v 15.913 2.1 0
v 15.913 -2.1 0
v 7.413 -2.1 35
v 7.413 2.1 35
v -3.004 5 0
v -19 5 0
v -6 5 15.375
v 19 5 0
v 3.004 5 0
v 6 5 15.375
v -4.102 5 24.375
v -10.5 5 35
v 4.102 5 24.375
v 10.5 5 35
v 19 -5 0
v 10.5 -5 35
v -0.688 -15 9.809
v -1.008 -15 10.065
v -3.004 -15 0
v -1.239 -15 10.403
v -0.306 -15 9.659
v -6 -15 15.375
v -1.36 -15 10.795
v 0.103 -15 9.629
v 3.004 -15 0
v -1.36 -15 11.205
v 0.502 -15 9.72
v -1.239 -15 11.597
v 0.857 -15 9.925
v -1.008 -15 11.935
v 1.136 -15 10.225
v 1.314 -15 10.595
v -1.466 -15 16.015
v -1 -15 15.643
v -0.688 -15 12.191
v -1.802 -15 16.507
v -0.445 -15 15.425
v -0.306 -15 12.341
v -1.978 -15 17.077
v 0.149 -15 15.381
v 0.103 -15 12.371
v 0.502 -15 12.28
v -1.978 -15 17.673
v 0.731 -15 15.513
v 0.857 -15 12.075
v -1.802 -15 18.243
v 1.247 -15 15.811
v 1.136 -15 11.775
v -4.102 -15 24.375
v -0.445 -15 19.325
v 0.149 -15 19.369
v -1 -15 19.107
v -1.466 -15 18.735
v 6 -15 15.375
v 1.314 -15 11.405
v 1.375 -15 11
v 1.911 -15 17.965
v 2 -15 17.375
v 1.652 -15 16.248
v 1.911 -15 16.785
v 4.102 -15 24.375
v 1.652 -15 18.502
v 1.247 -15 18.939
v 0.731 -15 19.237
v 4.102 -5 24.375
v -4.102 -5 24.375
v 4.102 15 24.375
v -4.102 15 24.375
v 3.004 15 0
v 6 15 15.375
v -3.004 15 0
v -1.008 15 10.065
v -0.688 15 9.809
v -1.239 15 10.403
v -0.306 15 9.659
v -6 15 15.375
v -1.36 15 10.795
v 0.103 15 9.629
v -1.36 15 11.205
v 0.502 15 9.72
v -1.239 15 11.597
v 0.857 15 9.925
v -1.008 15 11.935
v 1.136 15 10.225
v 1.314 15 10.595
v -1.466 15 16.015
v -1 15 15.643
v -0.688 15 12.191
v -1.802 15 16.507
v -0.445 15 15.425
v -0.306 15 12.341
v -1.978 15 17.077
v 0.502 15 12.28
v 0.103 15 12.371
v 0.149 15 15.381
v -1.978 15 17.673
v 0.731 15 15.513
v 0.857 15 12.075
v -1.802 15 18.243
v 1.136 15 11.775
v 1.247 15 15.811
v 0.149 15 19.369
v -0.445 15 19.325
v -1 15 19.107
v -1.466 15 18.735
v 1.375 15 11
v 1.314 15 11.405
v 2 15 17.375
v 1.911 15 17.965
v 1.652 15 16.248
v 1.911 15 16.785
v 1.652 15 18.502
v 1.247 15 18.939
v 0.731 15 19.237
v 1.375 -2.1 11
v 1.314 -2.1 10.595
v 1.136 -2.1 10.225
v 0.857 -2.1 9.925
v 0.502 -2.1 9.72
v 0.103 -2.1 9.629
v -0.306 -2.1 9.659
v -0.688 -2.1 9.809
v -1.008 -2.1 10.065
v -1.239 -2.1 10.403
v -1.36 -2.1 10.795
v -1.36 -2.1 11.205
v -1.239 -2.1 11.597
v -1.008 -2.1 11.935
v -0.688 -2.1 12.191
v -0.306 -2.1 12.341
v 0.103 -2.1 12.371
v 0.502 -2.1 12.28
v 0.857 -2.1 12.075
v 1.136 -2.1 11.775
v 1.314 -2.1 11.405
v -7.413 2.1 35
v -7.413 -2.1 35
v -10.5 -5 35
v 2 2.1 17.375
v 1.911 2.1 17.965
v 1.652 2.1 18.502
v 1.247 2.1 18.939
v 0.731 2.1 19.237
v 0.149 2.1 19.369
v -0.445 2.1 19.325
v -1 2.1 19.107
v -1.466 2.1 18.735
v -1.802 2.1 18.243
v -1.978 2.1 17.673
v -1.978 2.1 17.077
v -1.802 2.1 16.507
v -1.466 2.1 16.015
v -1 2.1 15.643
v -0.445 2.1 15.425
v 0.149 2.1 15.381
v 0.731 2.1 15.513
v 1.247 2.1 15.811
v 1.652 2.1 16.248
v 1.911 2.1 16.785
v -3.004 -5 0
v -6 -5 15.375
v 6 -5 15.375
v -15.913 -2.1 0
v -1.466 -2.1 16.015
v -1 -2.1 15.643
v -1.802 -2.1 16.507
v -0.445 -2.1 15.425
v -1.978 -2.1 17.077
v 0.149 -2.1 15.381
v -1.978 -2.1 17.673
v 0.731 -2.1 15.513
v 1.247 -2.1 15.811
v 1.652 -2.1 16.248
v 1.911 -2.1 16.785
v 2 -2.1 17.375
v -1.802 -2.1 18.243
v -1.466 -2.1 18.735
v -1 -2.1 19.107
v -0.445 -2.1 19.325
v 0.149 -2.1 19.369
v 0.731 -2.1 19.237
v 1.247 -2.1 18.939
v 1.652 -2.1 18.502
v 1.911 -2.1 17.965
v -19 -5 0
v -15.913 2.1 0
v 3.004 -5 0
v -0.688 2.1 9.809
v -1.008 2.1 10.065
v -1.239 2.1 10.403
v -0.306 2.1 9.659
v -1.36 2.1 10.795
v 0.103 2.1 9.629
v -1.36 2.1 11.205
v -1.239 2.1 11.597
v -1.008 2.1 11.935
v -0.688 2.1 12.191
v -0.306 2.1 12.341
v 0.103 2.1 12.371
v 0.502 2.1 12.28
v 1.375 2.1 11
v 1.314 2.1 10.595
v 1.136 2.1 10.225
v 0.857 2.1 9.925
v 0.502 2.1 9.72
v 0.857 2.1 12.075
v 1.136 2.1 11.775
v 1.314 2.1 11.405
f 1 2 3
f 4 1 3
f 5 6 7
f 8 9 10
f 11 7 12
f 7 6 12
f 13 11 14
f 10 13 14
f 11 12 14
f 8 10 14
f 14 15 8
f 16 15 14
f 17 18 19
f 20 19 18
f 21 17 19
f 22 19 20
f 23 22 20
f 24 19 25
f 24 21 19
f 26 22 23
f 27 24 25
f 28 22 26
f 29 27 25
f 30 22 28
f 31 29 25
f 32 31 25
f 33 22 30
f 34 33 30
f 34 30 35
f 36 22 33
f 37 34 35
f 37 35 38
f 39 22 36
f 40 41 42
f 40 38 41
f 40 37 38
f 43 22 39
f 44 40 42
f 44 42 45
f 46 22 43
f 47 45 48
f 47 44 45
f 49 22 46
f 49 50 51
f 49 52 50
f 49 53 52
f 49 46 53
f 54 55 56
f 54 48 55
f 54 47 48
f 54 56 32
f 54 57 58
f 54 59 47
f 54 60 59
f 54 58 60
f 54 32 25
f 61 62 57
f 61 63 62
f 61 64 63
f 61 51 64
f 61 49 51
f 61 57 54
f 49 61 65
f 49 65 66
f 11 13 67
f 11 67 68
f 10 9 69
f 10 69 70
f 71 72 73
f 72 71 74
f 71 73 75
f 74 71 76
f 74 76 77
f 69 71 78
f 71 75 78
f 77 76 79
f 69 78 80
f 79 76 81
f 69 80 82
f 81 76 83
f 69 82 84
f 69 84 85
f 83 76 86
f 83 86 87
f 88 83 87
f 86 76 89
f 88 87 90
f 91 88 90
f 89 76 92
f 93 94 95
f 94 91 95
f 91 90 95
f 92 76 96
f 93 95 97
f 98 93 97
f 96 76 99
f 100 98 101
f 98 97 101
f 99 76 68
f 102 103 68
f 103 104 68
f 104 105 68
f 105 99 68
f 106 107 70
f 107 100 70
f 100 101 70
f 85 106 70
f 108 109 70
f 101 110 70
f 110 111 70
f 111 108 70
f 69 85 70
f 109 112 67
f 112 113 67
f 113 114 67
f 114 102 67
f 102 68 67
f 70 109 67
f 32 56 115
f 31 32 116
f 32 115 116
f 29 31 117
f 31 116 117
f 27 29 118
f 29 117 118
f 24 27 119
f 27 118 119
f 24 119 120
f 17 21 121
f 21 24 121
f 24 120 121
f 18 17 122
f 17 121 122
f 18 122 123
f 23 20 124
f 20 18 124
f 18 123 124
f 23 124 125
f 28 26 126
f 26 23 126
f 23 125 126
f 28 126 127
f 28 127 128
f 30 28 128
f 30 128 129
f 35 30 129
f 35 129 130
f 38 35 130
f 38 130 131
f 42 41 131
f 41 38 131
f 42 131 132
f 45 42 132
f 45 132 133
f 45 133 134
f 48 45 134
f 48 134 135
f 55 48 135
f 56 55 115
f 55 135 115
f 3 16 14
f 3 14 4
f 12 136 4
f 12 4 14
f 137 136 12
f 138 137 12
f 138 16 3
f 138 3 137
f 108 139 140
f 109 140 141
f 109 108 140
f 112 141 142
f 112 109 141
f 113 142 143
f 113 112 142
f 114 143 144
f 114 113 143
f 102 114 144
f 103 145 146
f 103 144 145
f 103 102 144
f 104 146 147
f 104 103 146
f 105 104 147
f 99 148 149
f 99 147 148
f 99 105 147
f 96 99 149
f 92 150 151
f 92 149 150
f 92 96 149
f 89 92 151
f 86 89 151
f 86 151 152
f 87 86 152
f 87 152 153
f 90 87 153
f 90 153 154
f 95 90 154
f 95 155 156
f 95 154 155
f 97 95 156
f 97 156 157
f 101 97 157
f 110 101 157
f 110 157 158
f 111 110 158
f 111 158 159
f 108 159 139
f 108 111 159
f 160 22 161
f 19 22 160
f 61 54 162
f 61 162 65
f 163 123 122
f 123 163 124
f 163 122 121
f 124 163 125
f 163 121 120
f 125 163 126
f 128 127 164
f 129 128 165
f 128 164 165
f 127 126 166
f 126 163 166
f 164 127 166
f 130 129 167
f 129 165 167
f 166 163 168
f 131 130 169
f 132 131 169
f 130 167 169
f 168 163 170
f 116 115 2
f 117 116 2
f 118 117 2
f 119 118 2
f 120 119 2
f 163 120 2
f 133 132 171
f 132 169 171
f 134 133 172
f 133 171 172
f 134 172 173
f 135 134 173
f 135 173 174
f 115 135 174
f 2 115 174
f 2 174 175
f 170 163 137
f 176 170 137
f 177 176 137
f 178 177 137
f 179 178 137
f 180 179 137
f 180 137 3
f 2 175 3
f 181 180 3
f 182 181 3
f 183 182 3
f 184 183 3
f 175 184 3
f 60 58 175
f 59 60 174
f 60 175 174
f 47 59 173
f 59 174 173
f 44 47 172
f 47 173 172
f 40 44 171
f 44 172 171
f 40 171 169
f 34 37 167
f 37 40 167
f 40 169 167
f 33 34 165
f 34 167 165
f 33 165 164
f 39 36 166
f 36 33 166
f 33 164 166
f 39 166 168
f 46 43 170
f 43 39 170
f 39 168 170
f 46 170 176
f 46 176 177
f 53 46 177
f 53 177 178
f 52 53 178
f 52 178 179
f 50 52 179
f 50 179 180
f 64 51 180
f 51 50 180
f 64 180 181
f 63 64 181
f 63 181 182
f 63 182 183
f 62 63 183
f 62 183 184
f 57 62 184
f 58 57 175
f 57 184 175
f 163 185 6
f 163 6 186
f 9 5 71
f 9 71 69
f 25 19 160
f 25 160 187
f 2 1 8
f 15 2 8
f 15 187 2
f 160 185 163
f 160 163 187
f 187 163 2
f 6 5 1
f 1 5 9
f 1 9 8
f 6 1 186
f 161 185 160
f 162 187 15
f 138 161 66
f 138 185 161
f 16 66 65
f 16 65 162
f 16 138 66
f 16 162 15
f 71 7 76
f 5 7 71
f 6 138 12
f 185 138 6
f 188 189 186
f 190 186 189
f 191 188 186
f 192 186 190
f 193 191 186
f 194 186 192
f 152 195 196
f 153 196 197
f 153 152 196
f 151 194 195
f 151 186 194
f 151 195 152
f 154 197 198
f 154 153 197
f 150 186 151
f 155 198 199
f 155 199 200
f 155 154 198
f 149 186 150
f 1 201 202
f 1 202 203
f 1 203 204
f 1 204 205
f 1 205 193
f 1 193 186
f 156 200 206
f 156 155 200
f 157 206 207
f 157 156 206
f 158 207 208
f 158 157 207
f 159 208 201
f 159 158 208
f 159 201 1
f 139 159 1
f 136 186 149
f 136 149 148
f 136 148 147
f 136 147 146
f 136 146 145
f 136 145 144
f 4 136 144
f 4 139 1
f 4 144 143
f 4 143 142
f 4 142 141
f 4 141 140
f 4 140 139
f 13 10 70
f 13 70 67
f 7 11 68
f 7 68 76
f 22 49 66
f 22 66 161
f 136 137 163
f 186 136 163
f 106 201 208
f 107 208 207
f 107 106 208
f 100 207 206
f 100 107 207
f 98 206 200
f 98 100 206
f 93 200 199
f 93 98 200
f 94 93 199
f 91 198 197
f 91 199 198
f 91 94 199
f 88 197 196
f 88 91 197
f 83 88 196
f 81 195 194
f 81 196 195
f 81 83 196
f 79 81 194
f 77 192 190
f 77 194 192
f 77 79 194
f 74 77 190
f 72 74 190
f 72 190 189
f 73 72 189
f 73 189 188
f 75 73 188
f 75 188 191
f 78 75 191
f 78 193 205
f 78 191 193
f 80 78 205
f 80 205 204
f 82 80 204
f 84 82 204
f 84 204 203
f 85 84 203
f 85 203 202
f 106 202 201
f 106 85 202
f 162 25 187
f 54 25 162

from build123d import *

# Parameters (mm, degrees)
F1_DEPTH = 5
F3_DEPTH = 2.1
F4_R     = 1.375
F4_R_2   = 2
F5_DEPTH = 15
F6_W     = 3.8688962813
F6_H     = 4.2
F6_W_2   = 6.0080378316
F6_W_3   = 3.8534507621
F7_DEPTH = 35.001
F8_DEPTH = 20.001


with BuildPart() as f1:
    # F0 (on Front) → F1 (new body, symmetric)
    with BuildSketch(Plane.XZ):
        Polygon((-10.5, 35), (-19, 0), (19, 0), (10.5, 35), align=None)
    extrude(amount=F1_DEPTH, both=True)

    # F2 (on Front) → F3 (cut, symmetric)
    with BuildSketch(Plane.XZ):
        Polygon((-7.4127979777, 35), (-16.0847388882, -0.7079919843), (16.0847388882, -0.7079919843), (7.4127979777, 35), align=None)
    extrude(amount=F3_DEPTH, both=True, mode=Mode.SUBTRACT)

    # F4 (on Front) → F5 (join, symmetric)
    with BuildSketch(Plane.XZ):
        Polygon((4.1015339084, 24.375), (-4.1015339084, 24.375), (-6, 15.375), (-3.0040189158, 0), (3.0040189158, 0), (6, 15.375), align=None)
        with Locations((0, 11)):
            Circle(F4_R, mode=Mode.SUBTRACT)
        with Locations((0, 17.375)):
            Circle(F4_R_2, mode=Mode.SUBTRACT)
    extrude(amount=F5_DEPTH, both=True)

    # F6 (on face) → F7 (cut, through all)
    with BuildSketch(Plane(origin=(0, 0, 0), x_dir=(1, 0, 0), z_dir=(0, 0, -1))):
        with Locations((-4.9384670565, 0)):
            Rectangle(F6_W, F6_H)
        Rectangle(F6_W_2, F6_H)
        with Locations((4.9307442969, 0)):
            Rectangle(F6_W_3, F6_H)
    extrude(amount=-F7_DEPTH, mode=Mode.SUBTRACT)

    # F8 (cut, through all): faces of the model
    f8_faces = [f1.faces().sort_by_distance(p)[0] for p in [
        (0, 5, 17.375),
        (0, 5, 11),
    ]]
    extrude(f8_faces, amount=-F8_DEPTH, mode=Mode.SUBTRACT)


solid = f1.part
